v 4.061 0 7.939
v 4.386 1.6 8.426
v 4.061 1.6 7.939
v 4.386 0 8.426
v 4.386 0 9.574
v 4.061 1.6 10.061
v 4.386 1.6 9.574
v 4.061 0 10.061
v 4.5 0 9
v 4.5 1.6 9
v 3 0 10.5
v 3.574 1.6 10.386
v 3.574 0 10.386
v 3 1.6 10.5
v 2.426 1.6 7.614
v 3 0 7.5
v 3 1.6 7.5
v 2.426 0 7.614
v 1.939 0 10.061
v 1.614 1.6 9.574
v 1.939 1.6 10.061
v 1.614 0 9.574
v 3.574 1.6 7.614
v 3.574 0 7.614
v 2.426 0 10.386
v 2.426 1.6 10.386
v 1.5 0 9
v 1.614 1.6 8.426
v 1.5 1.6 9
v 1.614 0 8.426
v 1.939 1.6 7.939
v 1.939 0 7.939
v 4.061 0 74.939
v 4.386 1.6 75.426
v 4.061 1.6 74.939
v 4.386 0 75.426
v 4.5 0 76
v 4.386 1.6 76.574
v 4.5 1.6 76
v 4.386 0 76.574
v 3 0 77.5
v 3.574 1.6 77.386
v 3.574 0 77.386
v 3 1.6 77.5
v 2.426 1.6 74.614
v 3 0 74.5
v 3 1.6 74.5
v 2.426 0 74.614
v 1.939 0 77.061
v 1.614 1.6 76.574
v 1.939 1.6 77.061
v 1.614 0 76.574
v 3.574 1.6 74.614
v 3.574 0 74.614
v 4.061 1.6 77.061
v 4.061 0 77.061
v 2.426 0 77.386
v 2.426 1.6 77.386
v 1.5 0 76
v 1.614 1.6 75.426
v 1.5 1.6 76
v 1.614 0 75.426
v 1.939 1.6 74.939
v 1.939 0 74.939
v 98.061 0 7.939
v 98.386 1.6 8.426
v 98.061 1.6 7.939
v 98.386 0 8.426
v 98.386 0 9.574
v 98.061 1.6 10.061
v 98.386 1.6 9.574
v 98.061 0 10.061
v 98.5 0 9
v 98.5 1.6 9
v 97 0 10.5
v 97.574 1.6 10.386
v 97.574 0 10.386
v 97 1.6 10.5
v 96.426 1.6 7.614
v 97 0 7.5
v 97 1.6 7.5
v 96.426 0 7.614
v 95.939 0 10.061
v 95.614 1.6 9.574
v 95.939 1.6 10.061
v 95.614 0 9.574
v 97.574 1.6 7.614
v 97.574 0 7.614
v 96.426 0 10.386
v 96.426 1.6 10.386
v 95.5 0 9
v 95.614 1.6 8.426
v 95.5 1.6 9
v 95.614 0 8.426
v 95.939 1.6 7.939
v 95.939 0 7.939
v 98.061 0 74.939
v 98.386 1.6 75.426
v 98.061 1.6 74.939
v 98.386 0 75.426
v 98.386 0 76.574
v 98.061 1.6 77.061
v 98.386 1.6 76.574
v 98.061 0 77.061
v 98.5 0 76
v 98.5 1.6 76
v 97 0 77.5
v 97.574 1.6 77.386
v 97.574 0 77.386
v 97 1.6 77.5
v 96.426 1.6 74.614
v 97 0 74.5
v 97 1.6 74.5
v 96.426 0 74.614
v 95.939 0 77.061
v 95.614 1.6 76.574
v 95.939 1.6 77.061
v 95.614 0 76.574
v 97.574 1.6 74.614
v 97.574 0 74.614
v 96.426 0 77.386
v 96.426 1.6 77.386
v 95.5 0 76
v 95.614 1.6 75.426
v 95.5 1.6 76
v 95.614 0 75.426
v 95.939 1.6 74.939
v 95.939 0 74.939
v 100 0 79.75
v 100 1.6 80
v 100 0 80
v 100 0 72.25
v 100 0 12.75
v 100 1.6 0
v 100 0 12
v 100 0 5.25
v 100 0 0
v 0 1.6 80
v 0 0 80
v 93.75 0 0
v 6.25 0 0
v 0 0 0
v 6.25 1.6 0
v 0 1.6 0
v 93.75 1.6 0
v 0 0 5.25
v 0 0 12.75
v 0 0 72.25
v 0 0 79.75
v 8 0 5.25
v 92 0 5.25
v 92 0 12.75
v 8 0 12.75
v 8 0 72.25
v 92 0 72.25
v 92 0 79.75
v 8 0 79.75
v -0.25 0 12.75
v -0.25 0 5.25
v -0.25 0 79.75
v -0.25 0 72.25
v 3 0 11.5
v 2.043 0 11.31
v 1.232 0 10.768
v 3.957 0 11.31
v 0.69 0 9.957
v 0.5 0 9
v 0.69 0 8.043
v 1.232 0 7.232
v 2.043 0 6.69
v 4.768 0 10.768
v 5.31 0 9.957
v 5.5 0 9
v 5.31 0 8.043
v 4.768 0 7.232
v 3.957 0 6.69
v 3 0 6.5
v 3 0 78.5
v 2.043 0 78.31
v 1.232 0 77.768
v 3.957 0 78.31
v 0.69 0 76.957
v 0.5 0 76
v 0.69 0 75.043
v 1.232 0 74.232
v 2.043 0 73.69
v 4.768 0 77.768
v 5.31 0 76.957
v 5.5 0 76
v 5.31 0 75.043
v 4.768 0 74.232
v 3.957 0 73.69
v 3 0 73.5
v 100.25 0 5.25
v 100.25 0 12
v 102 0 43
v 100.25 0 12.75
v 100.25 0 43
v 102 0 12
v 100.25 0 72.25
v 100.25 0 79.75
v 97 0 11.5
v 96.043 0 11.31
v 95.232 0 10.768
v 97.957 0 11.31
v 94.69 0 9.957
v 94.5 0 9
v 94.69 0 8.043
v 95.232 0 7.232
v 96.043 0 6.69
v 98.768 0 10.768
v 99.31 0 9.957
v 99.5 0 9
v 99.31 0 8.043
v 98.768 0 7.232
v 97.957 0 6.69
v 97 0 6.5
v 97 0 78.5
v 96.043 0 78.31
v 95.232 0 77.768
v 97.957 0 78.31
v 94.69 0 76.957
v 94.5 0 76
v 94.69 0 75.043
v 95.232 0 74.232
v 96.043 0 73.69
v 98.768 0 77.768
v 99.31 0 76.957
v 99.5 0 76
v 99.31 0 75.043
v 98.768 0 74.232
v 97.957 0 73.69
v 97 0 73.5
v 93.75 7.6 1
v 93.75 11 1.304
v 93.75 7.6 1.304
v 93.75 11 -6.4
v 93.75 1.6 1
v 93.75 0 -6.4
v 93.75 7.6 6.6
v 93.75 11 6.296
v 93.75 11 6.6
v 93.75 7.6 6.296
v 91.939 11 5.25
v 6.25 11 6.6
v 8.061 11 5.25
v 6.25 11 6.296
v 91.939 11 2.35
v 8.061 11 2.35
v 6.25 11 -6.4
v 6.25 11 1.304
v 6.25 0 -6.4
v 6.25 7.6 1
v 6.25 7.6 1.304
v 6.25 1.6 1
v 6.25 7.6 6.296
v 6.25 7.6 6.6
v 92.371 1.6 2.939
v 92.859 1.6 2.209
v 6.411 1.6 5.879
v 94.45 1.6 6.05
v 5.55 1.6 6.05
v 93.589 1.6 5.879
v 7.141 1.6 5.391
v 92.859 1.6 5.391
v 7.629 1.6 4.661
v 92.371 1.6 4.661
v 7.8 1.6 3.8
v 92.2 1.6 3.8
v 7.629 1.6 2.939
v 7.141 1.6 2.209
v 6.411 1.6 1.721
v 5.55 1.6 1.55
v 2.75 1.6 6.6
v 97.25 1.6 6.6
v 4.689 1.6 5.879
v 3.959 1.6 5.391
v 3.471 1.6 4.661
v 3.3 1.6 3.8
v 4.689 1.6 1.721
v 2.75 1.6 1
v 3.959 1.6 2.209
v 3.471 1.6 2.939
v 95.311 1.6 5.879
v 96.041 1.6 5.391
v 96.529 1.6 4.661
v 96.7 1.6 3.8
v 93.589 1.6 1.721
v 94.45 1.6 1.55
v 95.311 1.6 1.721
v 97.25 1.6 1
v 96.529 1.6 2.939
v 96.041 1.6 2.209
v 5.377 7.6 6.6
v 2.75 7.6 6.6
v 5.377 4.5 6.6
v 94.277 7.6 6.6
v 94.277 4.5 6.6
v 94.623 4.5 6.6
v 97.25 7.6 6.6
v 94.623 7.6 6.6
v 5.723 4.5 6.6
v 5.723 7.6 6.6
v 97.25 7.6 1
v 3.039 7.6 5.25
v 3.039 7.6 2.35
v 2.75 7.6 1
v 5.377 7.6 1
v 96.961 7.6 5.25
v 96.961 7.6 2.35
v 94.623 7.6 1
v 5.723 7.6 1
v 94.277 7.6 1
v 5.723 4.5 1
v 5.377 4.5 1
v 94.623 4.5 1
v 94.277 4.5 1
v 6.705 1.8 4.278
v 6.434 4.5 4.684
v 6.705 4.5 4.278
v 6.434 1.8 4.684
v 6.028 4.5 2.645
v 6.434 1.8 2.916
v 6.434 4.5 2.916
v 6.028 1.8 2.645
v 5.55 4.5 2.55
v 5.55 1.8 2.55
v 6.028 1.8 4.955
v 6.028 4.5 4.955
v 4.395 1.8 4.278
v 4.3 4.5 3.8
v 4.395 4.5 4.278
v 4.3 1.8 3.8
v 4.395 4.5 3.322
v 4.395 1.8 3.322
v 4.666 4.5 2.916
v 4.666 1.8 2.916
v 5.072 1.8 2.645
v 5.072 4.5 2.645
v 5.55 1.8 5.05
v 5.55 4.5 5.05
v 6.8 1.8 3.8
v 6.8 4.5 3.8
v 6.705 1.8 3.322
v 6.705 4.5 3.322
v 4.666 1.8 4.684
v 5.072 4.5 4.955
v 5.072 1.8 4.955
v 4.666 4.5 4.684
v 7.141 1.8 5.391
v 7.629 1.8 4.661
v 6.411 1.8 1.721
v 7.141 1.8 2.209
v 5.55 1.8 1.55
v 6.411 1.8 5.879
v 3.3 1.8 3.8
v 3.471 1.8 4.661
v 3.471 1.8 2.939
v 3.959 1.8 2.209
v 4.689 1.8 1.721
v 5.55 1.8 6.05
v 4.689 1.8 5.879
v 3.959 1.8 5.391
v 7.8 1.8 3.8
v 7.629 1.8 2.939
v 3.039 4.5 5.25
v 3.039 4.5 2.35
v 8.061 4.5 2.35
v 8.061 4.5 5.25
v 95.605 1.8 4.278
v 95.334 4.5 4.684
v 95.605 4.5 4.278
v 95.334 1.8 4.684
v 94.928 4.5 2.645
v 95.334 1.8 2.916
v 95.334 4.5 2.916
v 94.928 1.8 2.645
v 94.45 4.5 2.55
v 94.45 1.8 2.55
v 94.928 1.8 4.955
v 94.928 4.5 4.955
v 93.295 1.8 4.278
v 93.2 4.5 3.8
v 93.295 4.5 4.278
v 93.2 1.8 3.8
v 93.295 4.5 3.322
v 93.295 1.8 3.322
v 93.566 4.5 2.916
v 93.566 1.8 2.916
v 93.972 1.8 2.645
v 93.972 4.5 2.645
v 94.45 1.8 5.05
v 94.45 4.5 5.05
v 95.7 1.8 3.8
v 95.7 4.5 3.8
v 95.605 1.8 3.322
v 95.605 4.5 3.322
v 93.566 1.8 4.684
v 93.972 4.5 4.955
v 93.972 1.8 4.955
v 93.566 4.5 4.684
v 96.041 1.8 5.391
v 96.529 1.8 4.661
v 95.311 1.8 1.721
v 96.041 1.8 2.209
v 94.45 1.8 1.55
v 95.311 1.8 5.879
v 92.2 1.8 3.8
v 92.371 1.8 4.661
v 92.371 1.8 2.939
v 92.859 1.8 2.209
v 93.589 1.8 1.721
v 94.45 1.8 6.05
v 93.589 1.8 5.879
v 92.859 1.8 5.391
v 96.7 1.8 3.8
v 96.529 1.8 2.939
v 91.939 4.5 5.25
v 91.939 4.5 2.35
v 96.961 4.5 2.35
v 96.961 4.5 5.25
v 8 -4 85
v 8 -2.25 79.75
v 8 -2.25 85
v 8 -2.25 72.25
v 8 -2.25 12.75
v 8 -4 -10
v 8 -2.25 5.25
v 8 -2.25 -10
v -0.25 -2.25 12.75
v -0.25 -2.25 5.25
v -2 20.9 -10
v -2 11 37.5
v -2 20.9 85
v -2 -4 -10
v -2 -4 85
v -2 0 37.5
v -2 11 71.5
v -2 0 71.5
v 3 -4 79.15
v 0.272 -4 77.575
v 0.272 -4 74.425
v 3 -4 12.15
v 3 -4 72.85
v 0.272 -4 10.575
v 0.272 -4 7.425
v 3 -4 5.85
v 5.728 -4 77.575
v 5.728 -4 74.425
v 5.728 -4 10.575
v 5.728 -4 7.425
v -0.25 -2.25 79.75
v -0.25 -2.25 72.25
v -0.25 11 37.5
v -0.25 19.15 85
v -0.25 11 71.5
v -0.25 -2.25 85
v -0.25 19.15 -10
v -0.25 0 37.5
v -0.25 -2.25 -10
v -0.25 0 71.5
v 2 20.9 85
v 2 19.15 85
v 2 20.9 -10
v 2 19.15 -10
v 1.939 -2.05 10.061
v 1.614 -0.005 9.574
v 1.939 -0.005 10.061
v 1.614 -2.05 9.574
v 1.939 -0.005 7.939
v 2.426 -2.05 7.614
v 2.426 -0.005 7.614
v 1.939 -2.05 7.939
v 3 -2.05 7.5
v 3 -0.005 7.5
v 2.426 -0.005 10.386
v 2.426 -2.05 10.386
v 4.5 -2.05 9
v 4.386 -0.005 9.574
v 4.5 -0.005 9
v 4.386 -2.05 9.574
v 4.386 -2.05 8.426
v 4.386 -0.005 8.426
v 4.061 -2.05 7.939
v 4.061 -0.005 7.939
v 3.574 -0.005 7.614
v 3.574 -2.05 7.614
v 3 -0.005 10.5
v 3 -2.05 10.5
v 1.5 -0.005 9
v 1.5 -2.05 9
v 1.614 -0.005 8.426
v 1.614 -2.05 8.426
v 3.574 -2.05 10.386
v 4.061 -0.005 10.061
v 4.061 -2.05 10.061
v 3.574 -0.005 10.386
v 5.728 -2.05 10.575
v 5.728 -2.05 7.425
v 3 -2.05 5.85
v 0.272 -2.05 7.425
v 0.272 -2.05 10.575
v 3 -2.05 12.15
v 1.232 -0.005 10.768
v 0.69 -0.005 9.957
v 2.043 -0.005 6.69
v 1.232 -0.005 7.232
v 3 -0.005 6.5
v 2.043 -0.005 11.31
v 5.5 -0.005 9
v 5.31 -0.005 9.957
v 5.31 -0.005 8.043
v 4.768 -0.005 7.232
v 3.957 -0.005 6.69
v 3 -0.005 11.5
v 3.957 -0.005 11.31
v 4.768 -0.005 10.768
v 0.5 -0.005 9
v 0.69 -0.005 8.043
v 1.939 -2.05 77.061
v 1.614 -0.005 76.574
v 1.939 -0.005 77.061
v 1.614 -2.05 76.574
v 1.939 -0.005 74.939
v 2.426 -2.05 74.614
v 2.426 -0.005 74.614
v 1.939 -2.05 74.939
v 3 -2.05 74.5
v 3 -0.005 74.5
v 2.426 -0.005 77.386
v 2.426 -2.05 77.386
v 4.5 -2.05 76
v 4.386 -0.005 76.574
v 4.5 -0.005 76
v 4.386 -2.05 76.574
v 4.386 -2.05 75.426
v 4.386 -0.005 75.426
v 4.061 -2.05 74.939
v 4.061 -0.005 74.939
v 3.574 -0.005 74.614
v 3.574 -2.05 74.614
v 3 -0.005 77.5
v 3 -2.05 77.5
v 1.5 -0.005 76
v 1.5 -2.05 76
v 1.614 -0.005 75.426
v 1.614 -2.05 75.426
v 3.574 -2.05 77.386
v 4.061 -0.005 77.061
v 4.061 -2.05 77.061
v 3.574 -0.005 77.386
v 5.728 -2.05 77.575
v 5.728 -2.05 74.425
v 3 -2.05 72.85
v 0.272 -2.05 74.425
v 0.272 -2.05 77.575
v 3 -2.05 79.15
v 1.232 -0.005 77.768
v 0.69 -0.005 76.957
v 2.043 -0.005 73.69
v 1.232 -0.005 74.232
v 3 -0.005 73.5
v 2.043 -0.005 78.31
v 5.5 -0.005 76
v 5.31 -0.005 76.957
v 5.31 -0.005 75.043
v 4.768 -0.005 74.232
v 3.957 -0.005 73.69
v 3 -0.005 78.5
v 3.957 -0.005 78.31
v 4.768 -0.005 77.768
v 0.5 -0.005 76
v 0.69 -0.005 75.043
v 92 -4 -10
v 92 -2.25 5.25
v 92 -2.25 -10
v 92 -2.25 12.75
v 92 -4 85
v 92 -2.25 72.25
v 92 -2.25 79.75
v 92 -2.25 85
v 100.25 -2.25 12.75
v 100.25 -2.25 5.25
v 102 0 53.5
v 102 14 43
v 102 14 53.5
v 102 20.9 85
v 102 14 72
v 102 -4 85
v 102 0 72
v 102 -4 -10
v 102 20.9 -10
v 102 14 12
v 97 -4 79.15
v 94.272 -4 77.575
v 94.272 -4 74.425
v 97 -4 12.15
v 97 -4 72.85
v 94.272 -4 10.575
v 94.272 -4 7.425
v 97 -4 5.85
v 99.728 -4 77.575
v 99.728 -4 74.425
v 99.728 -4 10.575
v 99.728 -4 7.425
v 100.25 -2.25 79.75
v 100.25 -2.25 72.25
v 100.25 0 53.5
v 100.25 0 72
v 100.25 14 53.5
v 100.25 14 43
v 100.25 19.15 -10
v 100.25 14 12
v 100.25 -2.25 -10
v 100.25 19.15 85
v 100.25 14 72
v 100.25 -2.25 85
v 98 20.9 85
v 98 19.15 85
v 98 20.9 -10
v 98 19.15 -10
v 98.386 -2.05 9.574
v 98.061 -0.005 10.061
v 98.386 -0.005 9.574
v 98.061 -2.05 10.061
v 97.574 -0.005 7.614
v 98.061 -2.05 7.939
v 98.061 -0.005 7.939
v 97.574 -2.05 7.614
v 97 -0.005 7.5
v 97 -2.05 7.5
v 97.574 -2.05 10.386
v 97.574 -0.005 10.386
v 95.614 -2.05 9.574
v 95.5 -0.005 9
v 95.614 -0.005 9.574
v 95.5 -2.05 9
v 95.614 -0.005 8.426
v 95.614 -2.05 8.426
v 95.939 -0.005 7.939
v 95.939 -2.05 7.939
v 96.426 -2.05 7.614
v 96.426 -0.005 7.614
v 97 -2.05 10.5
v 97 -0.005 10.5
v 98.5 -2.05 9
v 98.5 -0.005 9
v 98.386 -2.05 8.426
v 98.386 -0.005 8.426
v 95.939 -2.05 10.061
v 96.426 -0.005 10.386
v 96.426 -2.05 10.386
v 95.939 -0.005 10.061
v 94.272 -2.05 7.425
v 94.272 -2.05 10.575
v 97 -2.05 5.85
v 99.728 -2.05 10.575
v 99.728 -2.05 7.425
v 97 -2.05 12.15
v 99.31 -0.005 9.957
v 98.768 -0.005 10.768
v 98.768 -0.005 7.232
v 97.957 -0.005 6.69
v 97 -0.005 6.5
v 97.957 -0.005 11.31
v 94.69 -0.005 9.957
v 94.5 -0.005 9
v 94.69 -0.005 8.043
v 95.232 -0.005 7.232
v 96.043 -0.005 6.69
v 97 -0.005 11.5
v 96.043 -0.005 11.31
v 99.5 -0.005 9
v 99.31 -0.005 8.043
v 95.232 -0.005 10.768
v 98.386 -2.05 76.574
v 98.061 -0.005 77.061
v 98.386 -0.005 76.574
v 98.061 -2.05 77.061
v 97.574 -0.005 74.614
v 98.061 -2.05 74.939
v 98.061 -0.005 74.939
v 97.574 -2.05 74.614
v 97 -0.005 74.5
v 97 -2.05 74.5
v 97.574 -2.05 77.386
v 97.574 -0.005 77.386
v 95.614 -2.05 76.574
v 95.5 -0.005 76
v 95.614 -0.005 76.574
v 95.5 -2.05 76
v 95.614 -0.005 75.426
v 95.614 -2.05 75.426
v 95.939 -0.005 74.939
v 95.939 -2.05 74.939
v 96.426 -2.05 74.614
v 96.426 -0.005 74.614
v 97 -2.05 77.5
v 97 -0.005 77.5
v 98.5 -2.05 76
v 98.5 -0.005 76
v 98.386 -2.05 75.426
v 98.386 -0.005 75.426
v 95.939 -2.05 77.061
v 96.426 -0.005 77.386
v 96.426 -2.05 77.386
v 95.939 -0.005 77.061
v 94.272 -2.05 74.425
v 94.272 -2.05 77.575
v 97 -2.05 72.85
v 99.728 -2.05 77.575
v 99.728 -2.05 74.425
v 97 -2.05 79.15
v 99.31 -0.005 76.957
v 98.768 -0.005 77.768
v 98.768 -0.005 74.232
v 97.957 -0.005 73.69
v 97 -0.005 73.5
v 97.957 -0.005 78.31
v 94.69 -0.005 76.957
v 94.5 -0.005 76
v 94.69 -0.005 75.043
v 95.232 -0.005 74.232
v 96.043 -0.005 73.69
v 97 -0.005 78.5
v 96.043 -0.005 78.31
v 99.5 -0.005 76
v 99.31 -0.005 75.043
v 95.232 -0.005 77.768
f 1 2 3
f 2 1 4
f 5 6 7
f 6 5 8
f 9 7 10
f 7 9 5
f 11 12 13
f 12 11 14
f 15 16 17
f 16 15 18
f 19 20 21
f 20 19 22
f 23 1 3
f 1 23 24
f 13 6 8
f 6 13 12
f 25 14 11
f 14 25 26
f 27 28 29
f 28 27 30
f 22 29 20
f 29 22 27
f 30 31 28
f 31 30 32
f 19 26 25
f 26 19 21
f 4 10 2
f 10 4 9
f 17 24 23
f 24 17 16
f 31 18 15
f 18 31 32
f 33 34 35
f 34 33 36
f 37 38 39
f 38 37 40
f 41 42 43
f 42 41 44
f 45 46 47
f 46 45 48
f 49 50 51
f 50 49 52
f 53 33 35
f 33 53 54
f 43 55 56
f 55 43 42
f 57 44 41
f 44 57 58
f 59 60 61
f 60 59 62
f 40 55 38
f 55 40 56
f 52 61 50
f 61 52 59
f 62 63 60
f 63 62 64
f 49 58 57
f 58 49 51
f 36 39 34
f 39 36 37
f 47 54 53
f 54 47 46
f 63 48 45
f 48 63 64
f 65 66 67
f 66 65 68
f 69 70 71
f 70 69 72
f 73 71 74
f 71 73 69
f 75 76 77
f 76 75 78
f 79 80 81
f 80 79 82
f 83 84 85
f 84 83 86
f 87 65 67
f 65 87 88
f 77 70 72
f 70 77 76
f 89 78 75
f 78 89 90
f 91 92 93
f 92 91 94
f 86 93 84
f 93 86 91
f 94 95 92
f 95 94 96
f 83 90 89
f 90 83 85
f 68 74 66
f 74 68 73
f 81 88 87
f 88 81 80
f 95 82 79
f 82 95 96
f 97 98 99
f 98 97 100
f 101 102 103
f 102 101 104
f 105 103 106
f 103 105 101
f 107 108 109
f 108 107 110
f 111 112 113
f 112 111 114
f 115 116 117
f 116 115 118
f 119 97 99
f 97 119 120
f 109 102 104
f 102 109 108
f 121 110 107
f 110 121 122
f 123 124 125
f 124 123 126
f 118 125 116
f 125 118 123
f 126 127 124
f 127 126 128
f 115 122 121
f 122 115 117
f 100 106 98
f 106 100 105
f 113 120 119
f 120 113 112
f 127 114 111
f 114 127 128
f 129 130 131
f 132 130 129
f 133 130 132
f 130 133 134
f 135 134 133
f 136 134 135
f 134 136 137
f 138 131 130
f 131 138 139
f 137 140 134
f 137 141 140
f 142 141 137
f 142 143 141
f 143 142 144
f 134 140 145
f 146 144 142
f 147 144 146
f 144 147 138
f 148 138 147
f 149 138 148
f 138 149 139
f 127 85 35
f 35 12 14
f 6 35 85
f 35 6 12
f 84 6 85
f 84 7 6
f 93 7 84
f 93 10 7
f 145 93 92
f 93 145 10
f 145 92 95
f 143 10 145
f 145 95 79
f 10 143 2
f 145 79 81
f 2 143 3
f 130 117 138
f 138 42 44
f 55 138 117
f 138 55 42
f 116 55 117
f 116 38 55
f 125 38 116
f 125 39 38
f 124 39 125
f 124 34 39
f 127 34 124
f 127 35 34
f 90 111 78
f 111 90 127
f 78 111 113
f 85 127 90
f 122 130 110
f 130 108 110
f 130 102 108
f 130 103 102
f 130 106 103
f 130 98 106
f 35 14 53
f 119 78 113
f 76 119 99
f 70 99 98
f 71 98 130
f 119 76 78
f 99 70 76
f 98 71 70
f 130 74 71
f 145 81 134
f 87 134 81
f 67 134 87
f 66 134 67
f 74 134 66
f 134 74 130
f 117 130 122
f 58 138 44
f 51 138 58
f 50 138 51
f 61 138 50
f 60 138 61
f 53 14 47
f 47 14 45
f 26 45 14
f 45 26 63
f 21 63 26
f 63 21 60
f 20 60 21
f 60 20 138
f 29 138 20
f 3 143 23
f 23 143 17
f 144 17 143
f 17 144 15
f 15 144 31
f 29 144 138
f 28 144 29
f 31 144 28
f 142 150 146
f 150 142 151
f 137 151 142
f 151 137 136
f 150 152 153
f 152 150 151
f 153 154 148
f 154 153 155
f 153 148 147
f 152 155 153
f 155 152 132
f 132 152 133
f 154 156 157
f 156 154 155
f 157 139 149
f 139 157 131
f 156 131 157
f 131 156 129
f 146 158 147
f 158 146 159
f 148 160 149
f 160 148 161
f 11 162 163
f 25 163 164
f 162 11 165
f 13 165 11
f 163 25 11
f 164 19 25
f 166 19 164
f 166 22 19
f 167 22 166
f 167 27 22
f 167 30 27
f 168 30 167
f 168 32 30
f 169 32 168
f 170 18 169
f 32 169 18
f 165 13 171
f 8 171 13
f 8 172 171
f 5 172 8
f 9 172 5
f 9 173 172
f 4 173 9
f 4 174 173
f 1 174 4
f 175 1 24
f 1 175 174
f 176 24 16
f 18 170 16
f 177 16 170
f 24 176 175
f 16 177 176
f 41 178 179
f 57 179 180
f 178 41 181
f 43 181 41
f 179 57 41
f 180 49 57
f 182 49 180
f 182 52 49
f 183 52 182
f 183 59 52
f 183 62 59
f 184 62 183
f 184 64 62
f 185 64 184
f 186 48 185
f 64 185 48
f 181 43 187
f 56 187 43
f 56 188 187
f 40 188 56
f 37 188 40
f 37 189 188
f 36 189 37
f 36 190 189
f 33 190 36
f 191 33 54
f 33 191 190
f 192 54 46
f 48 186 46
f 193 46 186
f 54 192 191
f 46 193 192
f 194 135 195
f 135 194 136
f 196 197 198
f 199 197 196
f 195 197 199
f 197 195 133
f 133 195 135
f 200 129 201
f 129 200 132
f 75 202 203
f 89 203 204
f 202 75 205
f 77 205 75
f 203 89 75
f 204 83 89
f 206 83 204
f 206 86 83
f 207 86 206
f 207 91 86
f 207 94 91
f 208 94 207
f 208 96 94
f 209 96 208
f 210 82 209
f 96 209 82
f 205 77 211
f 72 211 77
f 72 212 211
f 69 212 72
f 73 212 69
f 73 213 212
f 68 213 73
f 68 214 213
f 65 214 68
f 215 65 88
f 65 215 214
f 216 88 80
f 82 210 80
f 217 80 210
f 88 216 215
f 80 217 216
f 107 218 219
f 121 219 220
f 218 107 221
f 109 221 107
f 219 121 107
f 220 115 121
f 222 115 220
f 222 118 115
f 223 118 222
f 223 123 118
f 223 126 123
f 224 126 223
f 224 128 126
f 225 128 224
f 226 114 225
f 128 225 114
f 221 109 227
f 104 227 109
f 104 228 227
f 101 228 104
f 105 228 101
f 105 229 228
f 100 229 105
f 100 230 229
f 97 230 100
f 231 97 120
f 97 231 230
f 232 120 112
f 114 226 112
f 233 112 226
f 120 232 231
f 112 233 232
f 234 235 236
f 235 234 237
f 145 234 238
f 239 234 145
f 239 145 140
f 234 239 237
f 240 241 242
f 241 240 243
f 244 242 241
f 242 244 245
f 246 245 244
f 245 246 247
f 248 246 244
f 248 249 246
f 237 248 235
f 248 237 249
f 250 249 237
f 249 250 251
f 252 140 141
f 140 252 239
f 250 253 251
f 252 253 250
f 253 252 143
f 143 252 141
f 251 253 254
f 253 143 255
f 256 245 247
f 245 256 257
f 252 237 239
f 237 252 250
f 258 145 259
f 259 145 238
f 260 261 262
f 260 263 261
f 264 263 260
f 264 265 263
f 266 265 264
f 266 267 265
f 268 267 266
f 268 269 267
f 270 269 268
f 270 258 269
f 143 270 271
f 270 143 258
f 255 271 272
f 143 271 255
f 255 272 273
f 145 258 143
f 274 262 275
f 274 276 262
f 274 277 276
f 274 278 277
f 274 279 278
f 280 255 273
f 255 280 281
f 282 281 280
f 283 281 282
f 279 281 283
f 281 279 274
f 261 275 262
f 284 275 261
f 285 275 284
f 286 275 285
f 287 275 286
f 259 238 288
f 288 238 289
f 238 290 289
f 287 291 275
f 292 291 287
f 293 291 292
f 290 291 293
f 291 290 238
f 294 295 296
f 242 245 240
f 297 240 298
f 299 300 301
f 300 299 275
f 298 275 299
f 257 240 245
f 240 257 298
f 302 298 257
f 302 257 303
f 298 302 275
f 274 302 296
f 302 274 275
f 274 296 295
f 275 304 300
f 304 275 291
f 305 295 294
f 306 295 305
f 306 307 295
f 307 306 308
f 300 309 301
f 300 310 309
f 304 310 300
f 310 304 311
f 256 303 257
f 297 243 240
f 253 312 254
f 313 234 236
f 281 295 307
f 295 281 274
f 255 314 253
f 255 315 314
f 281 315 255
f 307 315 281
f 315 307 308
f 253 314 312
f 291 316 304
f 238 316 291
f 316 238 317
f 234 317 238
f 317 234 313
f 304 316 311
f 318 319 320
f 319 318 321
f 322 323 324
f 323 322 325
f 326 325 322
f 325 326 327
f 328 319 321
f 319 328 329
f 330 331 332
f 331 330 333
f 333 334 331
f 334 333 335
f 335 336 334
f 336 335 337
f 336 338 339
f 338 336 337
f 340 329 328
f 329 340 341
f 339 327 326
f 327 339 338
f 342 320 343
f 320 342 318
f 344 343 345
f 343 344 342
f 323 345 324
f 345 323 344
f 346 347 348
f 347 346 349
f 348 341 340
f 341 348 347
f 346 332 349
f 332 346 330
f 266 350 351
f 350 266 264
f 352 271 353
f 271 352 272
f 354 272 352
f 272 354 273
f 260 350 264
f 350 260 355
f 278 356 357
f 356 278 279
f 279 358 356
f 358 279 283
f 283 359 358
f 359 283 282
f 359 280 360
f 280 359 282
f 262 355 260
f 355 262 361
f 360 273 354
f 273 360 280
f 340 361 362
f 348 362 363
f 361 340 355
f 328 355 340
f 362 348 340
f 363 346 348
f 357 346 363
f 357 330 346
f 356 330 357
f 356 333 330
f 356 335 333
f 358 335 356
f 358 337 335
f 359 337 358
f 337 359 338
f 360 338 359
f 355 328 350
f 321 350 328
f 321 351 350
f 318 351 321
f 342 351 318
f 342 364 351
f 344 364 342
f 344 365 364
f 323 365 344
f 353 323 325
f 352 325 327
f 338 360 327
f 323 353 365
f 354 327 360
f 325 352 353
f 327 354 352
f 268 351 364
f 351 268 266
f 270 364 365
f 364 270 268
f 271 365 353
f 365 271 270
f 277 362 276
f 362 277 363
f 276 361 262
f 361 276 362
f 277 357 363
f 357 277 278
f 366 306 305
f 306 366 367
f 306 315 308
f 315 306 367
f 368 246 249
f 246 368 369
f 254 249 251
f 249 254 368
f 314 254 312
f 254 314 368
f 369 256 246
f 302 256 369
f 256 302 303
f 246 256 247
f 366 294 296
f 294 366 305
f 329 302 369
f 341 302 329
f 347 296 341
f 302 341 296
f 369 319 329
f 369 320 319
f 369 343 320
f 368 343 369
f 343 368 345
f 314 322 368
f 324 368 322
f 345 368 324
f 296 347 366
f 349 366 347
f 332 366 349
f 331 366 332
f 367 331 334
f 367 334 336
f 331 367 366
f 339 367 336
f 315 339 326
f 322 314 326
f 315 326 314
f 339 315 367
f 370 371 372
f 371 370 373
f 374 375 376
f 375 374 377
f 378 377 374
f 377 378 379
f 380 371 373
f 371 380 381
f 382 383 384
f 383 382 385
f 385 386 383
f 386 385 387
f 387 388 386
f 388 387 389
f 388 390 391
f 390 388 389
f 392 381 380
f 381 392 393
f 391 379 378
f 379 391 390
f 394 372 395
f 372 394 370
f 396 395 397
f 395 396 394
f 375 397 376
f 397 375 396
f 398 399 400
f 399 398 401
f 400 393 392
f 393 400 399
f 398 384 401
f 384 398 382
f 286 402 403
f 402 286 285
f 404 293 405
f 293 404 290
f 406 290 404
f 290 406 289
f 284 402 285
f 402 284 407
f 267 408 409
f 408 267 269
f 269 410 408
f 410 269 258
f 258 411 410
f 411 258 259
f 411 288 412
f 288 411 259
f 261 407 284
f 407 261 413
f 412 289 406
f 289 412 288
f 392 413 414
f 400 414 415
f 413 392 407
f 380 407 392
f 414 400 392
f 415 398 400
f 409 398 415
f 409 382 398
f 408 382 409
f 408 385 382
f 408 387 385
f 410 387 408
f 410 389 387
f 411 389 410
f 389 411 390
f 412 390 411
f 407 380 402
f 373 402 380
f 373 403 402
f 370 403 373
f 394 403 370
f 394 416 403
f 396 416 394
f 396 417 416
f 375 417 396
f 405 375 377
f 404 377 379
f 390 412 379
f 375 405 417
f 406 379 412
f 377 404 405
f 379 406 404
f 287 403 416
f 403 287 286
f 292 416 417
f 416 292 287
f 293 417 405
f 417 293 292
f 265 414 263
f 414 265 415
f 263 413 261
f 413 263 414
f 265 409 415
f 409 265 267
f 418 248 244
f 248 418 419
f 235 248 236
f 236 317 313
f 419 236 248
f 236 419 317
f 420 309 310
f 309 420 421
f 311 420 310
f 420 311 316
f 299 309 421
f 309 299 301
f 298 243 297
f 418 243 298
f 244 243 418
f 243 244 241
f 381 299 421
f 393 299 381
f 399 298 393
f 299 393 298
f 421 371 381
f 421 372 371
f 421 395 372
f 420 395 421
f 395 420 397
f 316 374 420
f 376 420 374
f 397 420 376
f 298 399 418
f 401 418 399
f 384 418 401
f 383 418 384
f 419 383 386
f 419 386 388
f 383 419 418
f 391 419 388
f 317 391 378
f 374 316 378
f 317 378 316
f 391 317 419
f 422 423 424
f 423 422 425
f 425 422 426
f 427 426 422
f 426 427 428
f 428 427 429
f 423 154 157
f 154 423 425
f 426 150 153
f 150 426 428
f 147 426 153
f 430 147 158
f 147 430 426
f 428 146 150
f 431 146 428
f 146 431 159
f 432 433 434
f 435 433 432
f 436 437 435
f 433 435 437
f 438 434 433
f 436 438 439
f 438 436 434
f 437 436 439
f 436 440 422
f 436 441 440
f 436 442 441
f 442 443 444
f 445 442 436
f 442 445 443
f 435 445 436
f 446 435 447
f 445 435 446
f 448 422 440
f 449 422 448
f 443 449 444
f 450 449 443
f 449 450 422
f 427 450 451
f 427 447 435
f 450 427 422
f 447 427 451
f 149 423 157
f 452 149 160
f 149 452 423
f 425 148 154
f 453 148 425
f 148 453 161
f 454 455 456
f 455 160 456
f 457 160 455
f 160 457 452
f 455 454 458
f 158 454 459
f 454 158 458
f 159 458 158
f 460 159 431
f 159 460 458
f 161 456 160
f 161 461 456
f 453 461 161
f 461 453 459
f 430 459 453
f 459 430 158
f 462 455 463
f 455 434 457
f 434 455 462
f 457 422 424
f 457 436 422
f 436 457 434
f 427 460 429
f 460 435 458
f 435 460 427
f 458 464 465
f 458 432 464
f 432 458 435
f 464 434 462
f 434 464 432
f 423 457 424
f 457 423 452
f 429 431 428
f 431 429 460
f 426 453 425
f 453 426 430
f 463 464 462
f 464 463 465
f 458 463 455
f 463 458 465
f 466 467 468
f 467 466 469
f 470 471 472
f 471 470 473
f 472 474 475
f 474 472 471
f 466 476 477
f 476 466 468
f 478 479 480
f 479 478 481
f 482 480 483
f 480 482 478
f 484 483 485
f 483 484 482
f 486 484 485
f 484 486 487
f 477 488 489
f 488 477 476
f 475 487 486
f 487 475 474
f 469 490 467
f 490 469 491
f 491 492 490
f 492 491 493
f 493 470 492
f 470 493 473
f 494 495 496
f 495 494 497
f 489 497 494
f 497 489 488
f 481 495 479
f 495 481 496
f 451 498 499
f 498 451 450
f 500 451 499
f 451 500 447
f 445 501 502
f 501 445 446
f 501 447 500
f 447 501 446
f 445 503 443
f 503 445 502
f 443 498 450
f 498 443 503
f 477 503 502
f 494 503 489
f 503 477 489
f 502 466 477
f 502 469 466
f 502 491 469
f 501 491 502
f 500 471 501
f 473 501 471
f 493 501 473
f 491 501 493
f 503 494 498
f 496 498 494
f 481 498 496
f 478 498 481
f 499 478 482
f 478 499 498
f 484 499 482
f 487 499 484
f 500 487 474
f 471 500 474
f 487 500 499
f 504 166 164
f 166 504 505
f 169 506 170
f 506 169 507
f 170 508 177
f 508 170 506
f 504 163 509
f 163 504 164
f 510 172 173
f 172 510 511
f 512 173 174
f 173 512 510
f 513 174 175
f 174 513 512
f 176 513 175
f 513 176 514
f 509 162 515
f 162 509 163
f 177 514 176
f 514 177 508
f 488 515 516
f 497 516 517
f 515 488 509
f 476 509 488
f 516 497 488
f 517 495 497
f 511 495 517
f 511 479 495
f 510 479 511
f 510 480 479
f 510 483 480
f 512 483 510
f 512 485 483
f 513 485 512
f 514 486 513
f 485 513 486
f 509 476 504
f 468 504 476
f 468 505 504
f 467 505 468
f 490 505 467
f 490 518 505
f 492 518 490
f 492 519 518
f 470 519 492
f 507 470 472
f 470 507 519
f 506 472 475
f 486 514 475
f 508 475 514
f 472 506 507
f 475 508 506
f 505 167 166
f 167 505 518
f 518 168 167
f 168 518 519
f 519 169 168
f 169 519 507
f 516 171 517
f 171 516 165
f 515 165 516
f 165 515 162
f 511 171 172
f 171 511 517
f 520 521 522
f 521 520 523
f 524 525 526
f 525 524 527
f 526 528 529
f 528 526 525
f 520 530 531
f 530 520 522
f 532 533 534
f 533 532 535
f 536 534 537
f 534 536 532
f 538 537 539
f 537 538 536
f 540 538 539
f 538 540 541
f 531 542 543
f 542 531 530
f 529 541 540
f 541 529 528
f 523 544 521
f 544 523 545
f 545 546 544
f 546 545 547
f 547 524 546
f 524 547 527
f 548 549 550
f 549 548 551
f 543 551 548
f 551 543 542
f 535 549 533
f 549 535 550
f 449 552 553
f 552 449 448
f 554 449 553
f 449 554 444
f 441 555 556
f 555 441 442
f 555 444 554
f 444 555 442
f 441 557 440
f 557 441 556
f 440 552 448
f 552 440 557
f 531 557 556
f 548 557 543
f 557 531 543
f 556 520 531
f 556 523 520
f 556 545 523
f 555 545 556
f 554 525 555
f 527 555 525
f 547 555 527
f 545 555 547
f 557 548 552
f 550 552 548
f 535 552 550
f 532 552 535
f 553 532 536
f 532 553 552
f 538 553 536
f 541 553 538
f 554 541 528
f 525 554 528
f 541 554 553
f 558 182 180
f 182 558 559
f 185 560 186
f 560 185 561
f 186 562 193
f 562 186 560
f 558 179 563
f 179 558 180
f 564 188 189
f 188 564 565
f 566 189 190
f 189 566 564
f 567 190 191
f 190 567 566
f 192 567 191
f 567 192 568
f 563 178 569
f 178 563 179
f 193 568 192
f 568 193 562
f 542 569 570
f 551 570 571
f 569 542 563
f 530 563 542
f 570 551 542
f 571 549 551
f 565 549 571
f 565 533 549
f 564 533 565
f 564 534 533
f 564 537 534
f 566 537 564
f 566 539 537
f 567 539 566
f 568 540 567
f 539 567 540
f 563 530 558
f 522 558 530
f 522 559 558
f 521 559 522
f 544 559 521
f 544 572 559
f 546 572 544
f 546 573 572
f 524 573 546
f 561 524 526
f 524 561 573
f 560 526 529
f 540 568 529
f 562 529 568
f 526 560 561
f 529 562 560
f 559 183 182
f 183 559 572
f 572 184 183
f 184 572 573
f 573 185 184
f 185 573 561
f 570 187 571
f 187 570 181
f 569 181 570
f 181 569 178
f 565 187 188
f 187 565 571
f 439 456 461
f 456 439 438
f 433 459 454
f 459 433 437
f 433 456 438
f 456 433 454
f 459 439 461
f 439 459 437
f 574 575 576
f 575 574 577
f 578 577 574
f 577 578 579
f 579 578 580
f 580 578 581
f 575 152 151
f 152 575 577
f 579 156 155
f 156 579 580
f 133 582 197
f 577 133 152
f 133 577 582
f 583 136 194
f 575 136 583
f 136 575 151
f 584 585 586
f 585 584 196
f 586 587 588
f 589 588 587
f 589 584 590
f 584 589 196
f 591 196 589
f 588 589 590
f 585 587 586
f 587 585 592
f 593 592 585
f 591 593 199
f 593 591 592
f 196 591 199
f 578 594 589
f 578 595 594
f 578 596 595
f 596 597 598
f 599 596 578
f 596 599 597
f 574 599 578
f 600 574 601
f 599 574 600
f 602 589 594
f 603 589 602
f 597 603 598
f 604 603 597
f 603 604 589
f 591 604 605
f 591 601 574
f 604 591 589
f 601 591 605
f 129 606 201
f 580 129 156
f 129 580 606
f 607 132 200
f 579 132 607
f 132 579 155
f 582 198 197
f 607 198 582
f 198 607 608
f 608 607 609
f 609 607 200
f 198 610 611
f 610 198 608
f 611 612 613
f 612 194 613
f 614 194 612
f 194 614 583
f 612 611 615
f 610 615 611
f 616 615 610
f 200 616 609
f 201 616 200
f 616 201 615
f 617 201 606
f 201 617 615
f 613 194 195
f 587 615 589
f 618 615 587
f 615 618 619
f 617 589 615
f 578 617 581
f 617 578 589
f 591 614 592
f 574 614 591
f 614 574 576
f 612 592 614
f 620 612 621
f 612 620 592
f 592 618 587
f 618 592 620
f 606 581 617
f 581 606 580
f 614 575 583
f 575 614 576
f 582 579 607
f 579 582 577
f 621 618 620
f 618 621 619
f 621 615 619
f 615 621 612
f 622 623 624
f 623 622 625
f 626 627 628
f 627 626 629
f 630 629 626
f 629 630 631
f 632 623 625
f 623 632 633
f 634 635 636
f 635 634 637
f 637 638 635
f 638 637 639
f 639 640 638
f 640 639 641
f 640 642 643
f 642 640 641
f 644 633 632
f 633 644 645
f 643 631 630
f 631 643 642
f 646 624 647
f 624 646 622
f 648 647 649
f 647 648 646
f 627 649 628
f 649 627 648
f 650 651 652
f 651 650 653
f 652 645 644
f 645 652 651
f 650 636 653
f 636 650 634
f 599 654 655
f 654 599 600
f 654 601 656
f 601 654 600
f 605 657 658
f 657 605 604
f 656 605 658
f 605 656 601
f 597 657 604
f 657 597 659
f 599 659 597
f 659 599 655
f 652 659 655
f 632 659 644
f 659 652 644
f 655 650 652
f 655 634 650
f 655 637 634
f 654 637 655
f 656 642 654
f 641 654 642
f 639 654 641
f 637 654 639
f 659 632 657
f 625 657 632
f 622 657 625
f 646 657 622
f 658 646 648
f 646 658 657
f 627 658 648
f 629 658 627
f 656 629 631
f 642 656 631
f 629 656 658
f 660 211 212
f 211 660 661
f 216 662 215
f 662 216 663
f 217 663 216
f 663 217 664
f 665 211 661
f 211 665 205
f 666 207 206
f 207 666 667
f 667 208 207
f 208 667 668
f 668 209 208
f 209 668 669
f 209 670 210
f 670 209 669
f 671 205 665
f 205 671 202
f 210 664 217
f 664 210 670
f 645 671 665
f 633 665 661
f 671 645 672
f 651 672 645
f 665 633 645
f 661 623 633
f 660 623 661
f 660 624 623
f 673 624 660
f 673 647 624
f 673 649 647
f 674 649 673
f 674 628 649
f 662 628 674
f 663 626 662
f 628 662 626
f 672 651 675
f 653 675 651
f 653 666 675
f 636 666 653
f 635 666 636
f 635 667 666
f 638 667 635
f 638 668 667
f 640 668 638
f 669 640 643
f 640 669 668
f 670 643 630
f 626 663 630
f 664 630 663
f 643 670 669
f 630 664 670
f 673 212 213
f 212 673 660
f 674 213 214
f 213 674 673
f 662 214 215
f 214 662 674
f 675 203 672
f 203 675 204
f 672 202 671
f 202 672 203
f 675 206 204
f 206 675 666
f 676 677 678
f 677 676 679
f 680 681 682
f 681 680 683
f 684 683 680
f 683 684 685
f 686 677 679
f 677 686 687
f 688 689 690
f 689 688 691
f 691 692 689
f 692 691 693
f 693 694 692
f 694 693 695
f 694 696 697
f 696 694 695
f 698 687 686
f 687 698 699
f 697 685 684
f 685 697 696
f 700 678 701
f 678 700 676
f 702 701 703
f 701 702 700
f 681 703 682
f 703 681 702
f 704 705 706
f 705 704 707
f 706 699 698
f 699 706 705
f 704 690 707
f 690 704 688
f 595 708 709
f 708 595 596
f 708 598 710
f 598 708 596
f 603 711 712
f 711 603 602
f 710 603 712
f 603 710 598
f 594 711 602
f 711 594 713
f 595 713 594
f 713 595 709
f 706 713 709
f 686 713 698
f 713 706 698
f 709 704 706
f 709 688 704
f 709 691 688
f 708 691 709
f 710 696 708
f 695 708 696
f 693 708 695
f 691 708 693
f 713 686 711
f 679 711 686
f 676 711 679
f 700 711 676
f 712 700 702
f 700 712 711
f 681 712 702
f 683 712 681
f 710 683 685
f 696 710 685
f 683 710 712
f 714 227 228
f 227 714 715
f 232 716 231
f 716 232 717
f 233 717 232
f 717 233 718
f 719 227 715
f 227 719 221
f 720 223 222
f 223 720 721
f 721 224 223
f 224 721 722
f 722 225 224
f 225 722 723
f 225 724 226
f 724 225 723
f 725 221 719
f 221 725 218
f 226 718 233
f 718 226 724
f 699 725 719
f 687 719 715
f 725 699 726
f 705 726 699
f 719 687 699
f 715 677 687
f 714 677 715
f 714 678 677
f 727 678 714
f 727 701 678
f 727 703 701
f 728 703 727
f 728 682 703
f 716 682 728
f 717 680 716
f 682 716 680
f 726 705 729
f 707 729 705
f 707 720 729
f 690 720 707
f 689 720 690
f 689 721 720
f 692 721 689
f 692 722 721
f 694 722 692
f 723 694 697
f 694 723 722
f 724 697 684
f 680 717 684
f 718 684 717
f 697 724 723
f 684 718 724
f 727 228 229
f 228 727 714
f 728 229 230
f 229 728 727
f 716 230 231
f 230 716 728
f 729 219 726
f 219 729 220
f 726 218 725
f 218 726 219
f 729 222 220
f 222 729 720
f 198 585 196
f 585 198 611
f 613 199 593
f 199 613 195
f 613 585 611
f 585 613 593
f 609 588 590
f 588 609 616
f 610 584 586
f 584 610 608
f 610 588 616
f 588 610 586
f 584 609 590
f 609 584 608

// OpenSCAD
// file: ../library/din41612/din41612_male.scad
// din41612 male connector
// =======================

include <din41612_male_dim.scad>

use <../linurs/linurs_screw.scad>

module din41612_male(){ 
  // color("LightGrey")
  difference(){
    union(){
        translate([0,din41612_male_w1/2,din41612_male_h/2-din41612_male_h1])  
        cube([din41612_male_l1,
              din41612_male_w1,
              din41612_male_h],
             center=true);  
      translate([0,(din41612_male_w1-din41612_male_w)/2,(din41612_male_h-din41612_male_h1)/2]) 
        cube([din41612_male_l1,
              (din41612_male_w-din41612_male_w1),
              din41612_male_h-din41612_male_h1],
             center=true);  
      translate([0,din41612_male_w2/2+din41612_male_w1-din41612_male_w,din41612_male_h2/2])
        cube([din41612_male_l,
              din41612_male_w2,
              din41612_male_h2],
             center=true);  
    }
    for(i=[-1,1]){ // mounting holes
      translate([i*din41612_male_dl/2,
                 din41612_male_w1-din41612_male_w+din41612_male_w2/2, 
                 din41612_male_h1])
      rotate([180,0,90])screw_fix(
            w=din41612_male_h2, 
            d=M2_5, 
            type=head_cyl, 
            nut_sink=din41612_male_h,
            t=0);
    }
  }
}
din41612_male();  
// file: ../library/din41612/din41612_male_dim.scad
include <../linurs/linurs_screw_dim.scad>

// connector dimensions
din41612_male_l=94.5;    // lenght of the connector
din41612_male_l1=87.5;   // 
din41612_male_w=13;      // width of the connector
din41612_male_w1=6.4;    // 
din41612_male_w2=5.6;    // 
din41612_male_h=11;      // height of the connector
din41612_male_h1=1.6;    // 
din41612_male_h2=6;      // 

din41612_male_dl=88.9;   // distance between mounting holes
// file: ../library/din41612/din41612_female_dim.scad
include <../linurs/linurs_screw_dim.scad>

// connector dimensions
din41612_female_l=95;       // lenght of the connector
din41612_female_l1=85;      // lenght of the connector head
din41612_female_h=11.6;     // height of the connector
din41612_female_h1=5.2;     // height produced by the connector when pulgged in 
din41612_female_w=11;       // width of the connector
din41612_female_w1=8.5;     // width of the connector head

din41612_female_dl=90;      // distance between mounting holes
// file: ../pcb/pcb.scad
// pcb
// ===
// The pcb is the master object and has its 
// lower left corner solder side at the origin of the 
// coordinate system 

n=2;  // [1,2,3,4,5,6,7,8]
show_pcb="assemblies"; // [assemblies,assembly,pcb]

include <pcb_dim.scad>
include <../motherboard/motherboard_dim.scad>

use <../library/din41612/din41612_male.scad>

module pcb(){
  echo("pcb");  
  color("greenyellow")
  difference(){
    cube([pcb_l,pcb_h,pcb_w]); // pcb
    for(x=[-1,1]){ // mounting holes
      for(y=[pcb_wd1,pcb_wd1+pcb_wd]){
        translate([x*pcb_ld/2+pcb_l/2,0,y])
        rotate([90,0,0])
        cylinder(d=pcb_d,h=3*pcb_h,center=true,$fn=16);
      }
    }
  }
}

module pcb_assembly(){
  echo("pcb assembly");  
  pcb();  
  translate([pcb_l/2,pcb_h,0])  
  rotate([-90,0,0])din41612_male();  
}

module pcb_assemblies(n=1){
  echo("pcb assemblies"); 
  for(i=[0:n-1]){ // add the connectors
      echo(i);
      translate([0,step*i,0])
      pcb_assembly();
  }    
}    

if(show_pcb=="assemblies"){
  pcb_assemblies(n=n);
}

if(show_pcb=="assembly"){
  pcb_assembly();
}

if(show_pcb=="pcb"){
    // Move to center to create 2D drawings from top view 
    // with script OpenSCAD22d.py
    //
    rotate([90,0,180])
    //
    translate([-pcb_l/2,-pcb_h/2,-pcb_w/2])
    pcb();
}
// file: ../bracket/bracket.scad
// bracket
// =======
// A bracket of the elecbox module
// - type: 0 front bracket, 1 rear bracket
// - width 1..n in steps

// parameters for customizer
// bracket width
n=2; // [1,2,3,4,5,6,7,8]
// type
bracket="Front"; // [Front,Back]
// intermediate mounting holes
intermediate=false;  

include <../pcb/pcb_dim.scad>

include <../motherboard/motherboard_dim.scad>
include <../library/linurs/linurs_screw_dim.scad>
include <bracket_dim.scad>

use <../library/linurs/linurs_screw.scad>
    
module back_bracket(n=1, intermediate=false){
  mirror([1,0,0])       // mirror it if desired
  front_bracket(n=n, intermediate=intermediate); 
}
    
module front_bracket(n=1, intermediate=false){
  echo("bracket");  
  //color("White")
  intermediatestep=(intermediate)?step:0; 
  difference(){
    union(){
      translate([-bracket_h2/2-bracket_gap/2,
                 bracket_w(n)/2-bracket_w1,
                 bracket_l/2])  
      cube([bracket_h2,
            bracket_w(n),
            bracket_l],center=true); // create the bracket front
  
      translate([bracket_h/2-bracket_h2-bracket_gap/2,
                 bracket_t/2-bracket_w1,
                 bracket_l/2]) 
      cube([bracket_h,
            bracket_t,
            bracket_l],center=true); // U shape side of the screw
      
      translate([bracket_h1/2-bracket_h2-bracket_gap/2,
                 bracket_w(n)-bracket_w1-bracket_t/2,
                 bracket_l/2]) 
      cube([bracket_h1,
            bracket_t,
            bracket_l],center=true); // U shape where no screw  
      for(x=[1:n]){  // create the mounting hole cubes 
        for(z=[bracket_l1,
               bracket_l1+bracket_ld]){
          translate([ bracket_h/2-bracket_h2-bracket_gap/2,
                     -bracket_w1/2+(x-1)*intermediatestep,
                     z])
          cube([bracket_h,
                bracket_w1,
                bracket_l2],center=true);
        }
      }   
    }
    for(x=[1:n]){ // create the mounting hole 
      for(z=[bracket_l1,
             bracket_l1+bracket_ld]){
        translate([bracket_h3-bracket_h2-bracket_gap/2,
                  -bracket_w1/2+(x-1)*intermediatestep,
                   z])
        rotate([0,90,0])
        rotate([-90,0,0])
        screw_fix(w=bracket_w1,d=bracket_screw,type=head_no, t=bracket_screw_gap);
      }
    }
  }
}

if(bracket=="Front"){
  front_bracket(intermediate=intermediate,n=n);
}

if(bracket=="Back"){
  back_bracket(intermediate=intermediate,n=n);
}
// file: ../library/linurs/linurs_screw.scad
// Metric screws and nuts 
// urs@linurs.org 2019
// It is targeted for 3D printing applications. 
// To look realistic is not the goal (Example: Nuts do not have a hole)

include <linurs_screw_dim.scad>

d=0; //[0:M2_5,1:M3,2:M4,3:M5]
type=0;//[0:head_cyl,1:head_cnt,2:head_no,3:head_hex]
w=15; 
i=10;
nut_sink=0;
screw_sink=0; 
t=0.01;
fn=16;

/* [hex_bolt] */
show_hex_bolt=false;

/* [nut] */
show_nut=false;

/* [screw] */
show_screw=false;

/* [screw_fix] */
show_screw_fix=false;

/* [screw_cut] */
show_screw_cut=false;

/* [nut_cut] */
show_nut_cut=false;
wi=0; 
rot=false;

// functions used multiple times to position nuts and heads
function headh_cyl(d)=screw_cyl[d][1];  // height of cyl screw head
function headh_cnt(d)=screw_cyl[d][1];  // height of cnt screw head
function headh(d,type=head_cyl)=(type==head_cyl ? headh_cyl(d) : (type==head_cnt ? headh_cnt(d) : 0 )); // height of screw head 

function nuth(d)=screw_hex[d][2];   // height of hex nut

// head of a cylinder screw
module screw_head_cyl(d=M3, t=0)
{
  screwhd=screw_cyl[d][0]+t; // diameter of cylinder screw head
  cylinder(d=screwhd,h=headh(d=d, type=head_cyl), center=true,$fn=16); // screw head
}

// head of a countersunk screw
module screw_head_cnt(d=M3, t=0)
{
  screwd=screw_d[d]+t; 
  screwhd=screw_cnt[d][0]+t; // diameter of cylinder screw head
  cylinder(d1=screwd,d2=screwhd,h=headh(d=d,type=head_cnt), center=true,$fn=16); // screw head
}

// head of a hex screw
module screw_head_hex(d=M3, t=0)
{
    translate([0,0,-nuth(d)/2])nut(d=d, t=t);
}

// head of all screws
module screw_head(d=M3, type=head_cyl, t=0)
{ 
  if(type==head_cnt){
    screw_head_cnt(d=d, t=t);
  } else {
    if(type==head_cyl){
      screw_head_cyl(d=d, t=t);
    } else {
       if(type==head_hex){
           screw_head_hex(d=d, t=t); 
       } 
    }    
  }
}

// hex bolt 
module hex_bolt(d=M3, w=10, t=0)
{
  nutd=screw_hex[d][1]+t; // outer diameter of hex bolt
  cylinder(r=nutd/2,h=w+t, center=true,$fn=6); // nut
}

// nut 
module nut(d=M3, t=0)
{
  hex_bolt(d=d, w=nuth(d), t=t);    
}

// screw 
// w outer width of the screw = screw length + head 
module screw(w=10, d=M3, type=head_cyl, t=0){
  screwd=screw_d[d]+t;       // screw diameter
  cylinder(d=screwd, h=w, center=true,$fn=16); // screw thread length
  translate([0,0,w/2-headh(d=d,type=type)/2])
  screw_head(d=d,type=type, t=t);
}

// screw fix
// w outer width of the screw = screw length + head 
// sink additional material below to remove 
// raise additional material above to remove
module screw_fix(w=10, d=M3, type=head_cyl, screw_sink=0, nut_sink=0, t=0){
  screw(w=w, d=d, type=type, t=t);
  translate([0,0,-w/2+nuth(d)/2])
    nut(d=d,t=t);
  //additional material to be removed above the nut  
  translate([0,0,-(w+nut_sink)/2])hex_bolt(d=d,w=nut_sink+0.01,t=t);    
  //additional material to be removed above the screw head
  if(type==head_cnt){  
    translate([0,0,w/2+screw_sink])
    cylinder(d=screw_cnt[d][0]+t,h=screw_sink+0.01,center=true,$fn=16);
  }else{ 
    translate([0,0,(w+screw_sink)/2])
    cylinder(d=screw_cyl[d][0]+t,h=screw_sink+0.01,center=true,$fn=16);
  }     
}

// screw cut
// material to be extracted from object to slide in a counter sunk screw for fixation
// w height of the cut out
// i depth of the screw
module screw_cut(d=M3,w=20,i=10,t=0,fn=32){
    hsh=screw_cnt[d][1];
    ws=screw_cnt[d][0]+t;
    ds=screw_d[d]+t;
    
    translate([i/2,0,-(w-hsh)/2])
      cube([i,ws,hsh],center=true);
    
    translate([0,0,-(w-hsh)/2])
      cylinder(d=ws,h=hsh,center=true,$fn=32);
    
    translate([0,0,-(w-hsh)/2+hsh])
        cylinder(d2=ds, d1=ws, h=hsh,center=true,$fn=fn);
    
    cylinder(h=w, d=ds, center=true, $fn=fn);   
    
    translate([i/2,0,0]) 
        cube([i,ds,w],center=true);
    
    for(y=[-1,1]){
        translate([i/2,y*ds/2,-w/2+hsh])
            rotate([45,0,0])
            cube([i,sqrt(2)*(ws-ds)/2,sqrt(2)*(ws-ds)/2],center=true);
    }
}
//screw_cut();

// nut cut
// material to be extracted from object to slide in a nut for fixation
// w height of the cylinder
// i lenght of the inlet
module nut_cut(w=10, wi=0, d=M3, i=10, t=0, rot=false,type=head_cyl){ 
  r=(rot)?90:0;
  ds=(rot)?screw_hex[d][1]:screw_hex[d][0];
  rotate([0,0,r])nut(d,t);
  translate([i/2,0,0])
    cube([i,ds+t,nuth(d)+t],center=true);
  translate([0,0,-wi])
      if(type==head_cnt){    
          screw(w=w, d=d, type=type, t=t); 
        translate([0,0,w/2])
          cylinder(d=screw_cnt[d][0]+t,h=raise,center=true,$fn=16);
      }
      else{ 
          screw(w=w, d=d, type=type, t=t);   
  //      translate([0,0,0])
          //#cylinder(d=screw_cyl[d][0]+t,h=w,center=true,$fn=16);
      }       
}

if(show_hex_bolt==true){
   hex_bolt(d=d, w=w, t=t);
}

if(show_nut==true){
  nut(d=d, t=t);
}    

if(show_screw==true){
   screw(w=w, d=d, type=type, t=t);
}

if(show_screw_fix==true){
  screw_fix(w=w, d=d, type=type, nut_sink=nut_sink, screw_sink=screw_sink, t=t);
}

if(show_screw_cut==true){
  screw_cut(d=d,w=w,i=i,t=t,$fn=fn);
}    

if(show_nut_cut==true){
  nut_cut(w=w, wi=wi, d=d, i=i, t=t,rot=rot,type=type);
}  
// file: ../library/linurs/linurs_screw_dim.scad
// Metric screws and nuts 
// urs@linurs.org

// contains dimensions of linurs_screw and can be included in other 
// OpenScad files 

// Parameters in this file
// d screw diameter M2_5, M3, ... (enumeration with screw_d)
// t millimeters added to diameters 

// enumerations of metric threads
M2_5=0;
M3=1;
M4=2;
M5=3;

// enumerations screw head type
head_cyl=0; // cylinder
head_cnt=1; // countrsunk
head_no=2;  // no head at all
head_hex=3;  // no head at all

// screw diameters
screw_d=[
2.5, // M2.5
3.0, // M3
4.0, // M4
5.0  // M5
];

// sizes for hex nuts
screw_hex=[
//   s,   e,   h
 [ 5.0, 5.8, 1.7], // M2.5
 [ 5.5, 6.4, 2.0], // M3
 [ 7.0, 8.1, 2.8], // M4
 [ 8.0, 9.2, 3.5]  // M5
];

// sizes for cylinder screw heads
screw_cyl=[
//   d,   h
 [ 4.5, 1.6], // M2.5
 [ 5.5, 2.0], // M3
 [ 7.0, 2.6], // M4
 [ 8.5, 3.3]  // M5
];

// sizes for countersunk screw heads
screw_cnt=[
//   d,   h
 [ 4.7, 1.50], // M2.5
 [ 5.6, 1.65], // M3
 [ 7.4, 2.20], // M4
 [ 9.2, 2.50]  // M5
];
// file: ../motherboard/motherboard_dim.scad
include <../library/linurs/linurs_screw_dim.scad>
include <../library/din41612/din41612_female_dim.scad>
include <../library/din41612/din41612_male_dim.scad>
include <../pcb/pcb_dim.scad>
// motherboard pcb dimensions
motherboard_l=pcb_l;   // pcb width
motherboard_h=1.6;     // pcb thickness
step=25.4;             // distance between modules

function motherboard_w(n)=din41612_female_w+step*(n-1);

screw_motherboard_d=M2_5;
screw_motherboard_l=16;
motherboard_pass=0.5;// gap to fit screws 

motherboard_z_offset=-din41612_male_w1-din41612_female_h1-motherboard_h;
// file: ../bracket/bracket_dim.scad
// bracket

include <../pcb/pcb_dim.scad>
include <../motherboard/motherboard_dim.scad>
include <../library/linurs/linurs_screw_dim.scad>

bracket_screw=M2_5;   // hole for the screw

bracket_gap=0.5;      // gap between bracket to make sure it fits in the box
bracket_screw_gap=0.5;// gap to fit the screw

bracket_l=pcb_w+15;   // height of bracket
bracket_l1=19;        // hole l
bracket_l2=3*screw_d[bracket_screw];
bracket_ld=pcb_wd;    // hole distance

bracket_h=10;         // depth of the U shape at the side of the screw
bracket_h1=4;         // depth of the U shape at the side where no screw is 
bracket_h2=2-bracket_gap/2;   // thickness of bracket
bracket_h3=5;         // hole h

bracket_w1=4;         // height of the mounting hole cube
bracket_tn=2;         // thickness of bracket
bracket_t=bracket_tn-bracket_gap/2;  // thickness of bracket - gap

bracket_offset_z=-10;  // bracket offset in elecbox z axis

function bracket_w(n)=step*n-bracket_gap;
function bracket_w2(n)=step*n-2*bracket_tn;
// file: ../pcb/pcb_dim.scad
// The pcb is the master object of the project
// therefore no other include files from other objects
// are necessary

// pcb constants
pcb_l =100;  // lenght of the pcb
pcb_ld = 94; // hole distance 
pcb_w=80;    // height of the pcb
pcb_wd = 67; // hole distance
pcb_wd1 = 9; // hole to edge distance 
pcb_d=3;     // diameter of holes
pcb_h=1.6;   // thickness
// main file
// 3DprinterIO module
// ==================

3DprinterIO="assembly"; // [assembly,front,back,print_front,print_back]

include <../pcb/pcb_dim.scad>
include <../bracket/bracket_dim.scad>
include <../motherboard/motherboard_dim.scad>
include <../library/linurs/linurs_screw_dim.scad>

use <../library/linurs/linurs_screw.scad>
use <../bracket/bracket.scad>
use <../pcb/pcb.scad>

module 3DprinterIO_back(){
    h1=14;
    w1=31;
    z1=12;
 
    h2=14;
    w2=18.5;
    z2=53.5;
    difference(){
        translate([0,0,bracket_offset_z])back_bracket(n=1);
        
        translate([
          0,
          h1/2,
          z1+w1/2])
        cube([
          bracket_h,
          h1,
          w1],center=true); 
        
        translate([
          0,
          h2/2,
          z2+w2/2])
        cube([
          bracket_h,
          h2,
          w2],center=true);               
    }
}

module 3DprinterIO_front(){
    h1=11;
    w1=34;
    z1=37.5;
    
    difference(){
        translate([0,0,bracket_offset_z])front_bracket(n=1);
        
        translate([
          0,
          h1/2,
          z1+w1/2])
        cube([
          bracket_h,
          h1,
          w1],center=true);        
    }
}

module 3DprinterIO_assembly(){
    pcb_assembly();
    3DprinterIO_front();
    translate([pcb_l,0,0])3DprinterIO_back();
}

if(3DprinterIO=="assembly"){
  3DprinterIO_assembly();
}

if(3DprinterIO=="front"){
  3DprinterIO_front();
}

if(3DprinterIO=="back"){
  3DprinterIO_back();
}

if(3DprinterIO=="print_front"){
  rotate([0,-90,0])
    3DprinterIO_front();
}

if(3DprinterIO=="print_back"){
  rotate([0,90,0])3DprinterIO_back();
}
